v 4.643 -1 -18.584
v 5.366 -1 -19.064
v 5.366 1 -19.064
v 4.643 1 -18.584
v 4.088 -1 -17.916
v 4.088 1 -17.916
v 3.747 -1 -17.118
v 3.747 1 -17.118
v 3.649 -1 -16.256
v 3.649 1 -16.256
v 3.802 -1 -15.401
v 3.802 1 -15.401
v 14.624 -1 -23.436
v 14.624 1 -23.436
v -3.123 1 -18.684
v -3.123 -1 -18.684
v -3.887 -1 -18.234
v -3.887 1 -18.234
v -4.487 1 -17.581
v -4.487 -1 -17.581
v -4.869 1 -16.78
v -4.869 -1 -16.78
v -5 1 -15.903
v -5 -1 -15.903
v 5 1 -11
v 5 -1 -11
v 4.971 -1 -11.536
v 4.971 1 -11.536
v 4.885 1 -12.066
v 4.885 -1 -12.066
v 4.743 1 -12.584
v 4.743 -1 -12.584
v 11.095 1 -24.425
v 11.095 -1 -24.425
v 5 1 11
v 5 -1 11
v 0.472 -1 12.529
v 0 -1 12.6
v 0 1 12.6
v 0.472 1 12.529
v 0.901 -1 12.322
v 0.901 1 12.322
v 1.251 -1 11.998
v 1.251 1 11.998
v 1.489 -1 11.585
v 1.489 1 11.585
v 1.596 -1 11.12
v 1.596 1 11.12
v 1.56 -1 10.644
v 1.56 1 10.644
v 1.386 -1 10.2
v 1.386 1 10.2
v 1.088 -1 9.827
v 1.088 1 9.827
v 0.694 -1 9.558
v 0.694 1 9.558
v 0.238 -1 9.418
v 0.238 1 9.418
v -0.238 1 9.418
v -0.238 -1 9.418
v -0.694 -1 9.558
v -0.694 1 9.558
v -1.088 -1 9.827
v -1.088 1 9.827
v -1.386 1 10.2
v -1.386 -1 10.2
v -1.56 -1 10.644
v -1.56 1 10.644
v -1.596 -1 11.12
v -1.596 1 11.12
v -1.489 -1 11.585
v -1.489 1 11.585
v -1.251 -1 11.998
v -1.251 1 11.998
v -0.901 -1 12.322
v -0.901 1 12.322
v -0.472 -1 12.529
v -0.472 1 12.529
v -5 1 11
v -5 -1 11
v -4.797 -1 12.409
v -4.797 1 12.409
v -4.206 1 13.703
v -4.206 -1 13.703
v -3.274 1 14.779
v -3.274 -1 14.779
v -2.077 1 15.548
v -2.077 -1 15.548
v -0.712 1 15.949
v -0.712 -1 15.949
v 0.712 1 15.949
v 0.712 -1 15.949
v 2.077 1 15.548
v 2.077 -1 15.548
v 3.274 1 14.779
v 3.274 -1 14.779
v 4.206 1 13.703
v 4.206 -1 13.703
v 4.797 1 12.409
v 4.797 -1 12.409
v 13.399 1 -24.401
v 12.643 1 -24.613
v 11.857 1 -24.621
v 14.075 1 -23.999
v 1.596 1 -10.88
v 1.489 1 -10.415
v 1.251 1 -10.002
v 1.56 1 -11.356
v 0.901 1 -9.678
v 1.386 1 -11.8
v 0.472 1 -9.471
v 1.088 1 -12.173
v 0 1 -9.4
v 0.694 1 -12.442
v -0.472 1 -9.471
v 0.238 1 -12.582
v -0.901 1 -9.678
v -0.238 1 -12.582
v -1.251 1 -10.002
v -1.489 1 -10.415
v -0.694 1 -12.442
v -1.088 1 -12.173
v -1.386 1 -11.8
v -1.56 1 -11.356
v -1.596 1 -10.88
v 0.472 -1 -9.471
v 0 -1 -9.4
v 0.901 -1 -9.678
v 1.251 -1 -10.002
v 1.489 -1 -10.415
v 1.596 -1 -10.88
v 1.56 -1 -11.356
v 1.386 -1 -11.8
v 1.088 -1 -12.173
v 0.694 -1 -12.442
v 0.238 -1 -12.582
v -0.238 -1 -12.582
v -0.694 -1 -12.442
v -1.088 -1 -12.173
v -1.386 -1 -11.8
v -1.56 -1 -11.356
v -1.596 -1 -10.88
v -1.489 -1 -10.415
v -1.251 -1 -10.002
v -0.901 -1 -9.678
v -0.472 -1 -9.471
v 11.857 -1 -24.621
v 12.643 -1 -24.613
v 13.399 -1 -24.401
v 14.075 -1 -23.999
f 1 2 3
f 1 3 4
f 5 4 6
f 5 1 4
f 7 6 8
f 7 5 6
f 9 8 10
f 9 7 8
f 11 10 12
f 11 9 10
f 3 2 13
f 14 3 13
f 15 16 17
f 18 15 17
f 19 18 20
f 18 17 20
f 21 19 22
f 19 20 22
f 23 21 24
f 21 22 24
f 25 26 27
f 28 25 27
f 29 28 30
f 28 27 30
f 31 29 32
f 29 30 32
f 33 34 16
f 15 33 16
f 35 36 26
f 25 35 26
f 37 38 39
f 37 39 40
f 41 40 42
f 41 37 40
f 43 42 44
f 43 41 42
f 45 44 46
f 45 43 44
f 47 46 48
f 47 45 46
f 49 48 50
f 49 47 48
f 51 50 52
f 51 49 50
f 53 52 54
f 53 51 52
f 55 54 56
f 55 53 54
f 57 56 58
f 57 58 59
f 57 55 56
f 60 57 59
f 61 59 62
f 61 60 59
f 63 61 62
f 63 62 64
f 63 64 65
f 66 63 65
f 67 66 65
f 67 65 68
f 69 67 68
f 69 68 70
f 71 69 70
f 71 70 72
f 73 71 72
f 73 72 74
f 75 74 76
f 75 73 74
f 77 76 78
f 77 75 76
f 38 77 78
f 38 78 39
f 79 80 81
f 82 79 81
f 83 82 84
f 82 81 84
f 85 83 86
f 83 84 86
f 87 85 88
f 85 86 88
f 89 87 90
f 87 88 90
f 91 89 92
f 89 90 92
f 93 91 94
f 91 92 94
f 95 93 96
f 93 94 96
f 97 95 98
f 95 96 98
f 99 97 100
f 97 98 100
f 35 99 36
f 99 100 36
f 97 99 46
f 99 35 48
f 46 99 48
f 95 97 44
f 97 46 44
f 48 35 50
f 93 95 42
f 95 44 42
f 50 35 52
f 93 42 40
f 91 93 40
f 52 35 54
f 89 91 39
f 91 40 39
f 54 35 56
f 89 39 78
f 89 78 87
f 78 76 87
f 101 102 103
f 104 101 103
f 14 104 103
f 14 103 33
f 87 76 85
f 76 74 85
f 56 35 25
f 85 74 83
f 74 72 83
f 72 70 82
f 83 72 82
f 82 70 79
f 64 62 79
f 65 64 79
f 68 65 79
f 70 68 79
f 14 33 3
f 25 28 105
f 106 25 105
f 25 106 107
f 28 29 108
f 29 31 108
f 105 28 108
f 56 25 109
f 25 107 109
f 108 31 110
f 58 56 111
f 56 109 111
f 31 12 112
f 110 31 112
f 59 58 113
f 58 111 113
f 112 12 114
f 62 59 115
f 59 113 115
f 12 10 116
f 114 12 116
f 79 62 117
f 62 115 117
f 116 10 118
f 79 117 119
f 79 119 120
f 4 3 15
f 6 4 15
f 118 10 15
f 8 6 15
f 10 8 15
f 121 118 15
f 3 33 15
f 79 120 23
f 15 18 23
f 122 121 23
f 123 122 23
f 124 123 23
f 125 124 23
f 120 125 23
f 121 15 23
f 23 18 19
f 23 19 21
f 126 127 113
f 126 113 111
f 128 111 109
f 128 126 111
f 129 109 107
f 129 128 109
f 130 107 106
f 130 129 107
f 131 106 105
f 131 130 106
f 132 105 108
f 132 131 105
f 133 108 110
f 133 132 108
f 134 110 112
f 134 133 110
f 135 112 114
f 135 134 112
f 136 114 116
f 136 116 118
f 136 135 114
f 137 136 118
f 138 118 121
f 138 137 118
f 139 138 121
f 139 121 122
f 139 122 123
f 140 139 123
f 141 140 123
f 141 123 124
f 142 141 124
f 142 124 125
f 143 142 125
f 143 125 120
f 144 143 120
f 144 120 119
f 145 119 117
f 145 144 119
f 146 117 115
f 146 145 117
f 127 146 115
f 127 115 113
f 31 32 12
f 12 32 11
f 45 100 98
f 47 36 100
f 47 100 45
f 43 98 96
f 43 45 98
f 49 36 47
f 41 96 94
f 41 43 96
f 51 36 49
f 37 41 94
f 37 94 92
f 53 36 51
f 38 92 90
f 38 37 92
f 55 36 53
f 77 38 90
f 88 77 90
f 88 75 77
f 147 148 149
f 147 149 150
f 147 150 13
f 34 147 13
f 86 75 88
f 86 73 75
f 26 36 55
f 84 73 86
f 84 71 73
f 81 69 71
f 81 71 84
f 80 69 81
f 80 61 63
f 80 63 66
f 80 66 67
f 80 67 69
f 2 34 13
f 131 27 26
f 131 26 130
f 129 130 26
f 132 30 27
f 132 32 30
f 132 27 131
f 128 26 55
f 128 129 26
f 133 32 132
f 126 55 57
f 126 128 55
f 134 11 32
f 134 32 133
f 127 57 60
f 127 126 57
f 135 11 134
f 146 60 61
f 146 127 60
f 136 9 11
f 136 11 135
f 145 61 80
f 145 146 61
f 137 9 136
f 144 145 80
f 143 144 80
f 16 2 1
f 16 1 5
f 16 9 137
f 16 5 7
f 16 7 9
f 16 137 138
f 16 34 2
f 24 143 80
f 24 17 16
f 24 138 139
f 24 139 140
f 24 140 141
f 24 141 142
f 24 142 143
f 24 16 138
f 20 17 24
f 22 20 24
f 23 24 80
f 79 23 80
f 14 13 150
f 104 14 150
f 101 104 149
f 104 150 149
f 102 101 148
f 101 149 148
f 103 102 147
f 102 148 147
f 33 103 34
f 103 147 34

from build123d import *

# Parameters (mm, degrees)
BOSS_EXTRUDE1_DEPTH      = 1
BOSS_EXTRUDE1_DEPTH_BACK = 1
SKETCH1_R                = 1.6
BOSS_EXTRUDE4_START      = -2
BOSS_EXTRUDE4_DEPTH      = 2
FILLET1_R                = 3


with BuildPart() as part:
    # Sketch1 → Boss-Extrude1 (new, two sides: drawn at the far end of the back side and taken through both)
    with BuildSketch(Plane(origin=(0, 0, 0), x_dir=(1, 0, 0), z_dir=(0, 1, 0)).offset(-BOSS_EXTRUDE1_DEPTH_BACK)):
        with BuildLine():
            ThreePointArc((5, 11), (0, 16), (-5, 11))
            Line((-5, 11), (-5, -11))
            ThreePointArc((-5, -11), (0, -16), (5, -11))
            Line((5, -11), (5, 11))
        make_face()
        with Locations(Location((0, 11, 0), (0, 0, 270))):
            Circle(SKETCH1_R, mode=Mode.SUBTRACT)
        with Locations(Location((0, -11, 0), (0, 0, 270))):
            Circle(SKETCH1_R, mode=Mode.SUBTRACT)
    extrude(amount=BOSS_EXTRUDE1_DEPTH + BOSS_EXTRUDE1_DEPTH_BACK)

    # Sketch4 → Boss-Extrude4 (add)
    with BuildSketch(Plane(origin=(0, 1, 0), x_dir=(1, 0, 0), z_dir=(0, 1, 0)).offset(BOSS_EXTRUDE4_START)):
        with BuildLine():
            Line((2.958312472, 17.926759894), (-2.135268449, 15.521131346))
            ThreePointArc((-2.135268449, 15.521131346), (1.963819075, 15.59819689), (4.742555811, 12.58371853))
            Line((4.742555811, 12.58371853), (2.958312472, 17.926759894))
        make_face()
        with BuildLine():
            ThreePointArc((-5, 11), (-4.223525911, 13.676159352), (-2.135268449, 15.521131346))
            Line((-2.135268449, 15.521131346), (2.958312472, 17.926759894))
            Line((2.958312472, 17.926759894), (14.623518216, 23.436076894))
            Line((14.623518216, 23.436076894), (13.666416412, 25.462605676))
            Line((13.666416412, 25.462605676), (-5, 17.926759894))
            Line((-5, 17.926759894), (-5, 11))
        make_face()
    extrude(amount=BOSS_EXTRUDE4_DEPTH)

    # Fillet1
    # the kernel refuses this fillet: 3 mm, written as the material it adds along each edge
    with BuildSketch(Plane(origin=(2.958312472, -1, -17.926759894), x_dir=(0.9042262692177064, 0, -0.42705368989932413), z_dir=(0, 1, 0))) as fillet1_piece_1:
        with BuildLine():
            CenterArc((FILLET1_R * 0.887613530768, -FILLET1_R), FILLET1_R, 90, 83.185387179)
            Line((-FILLET1_R * 0.105321747078, -FILLET1_R * 0.881342787793), (0, 0))
            Line((0, 0), (FILLET1_R * 0.887613530768, 0))
        make_face()
    extrude(amount=2)
    # the kernel refuses this fillet: 3 mm, written as the material it takes off along each edge
    with BuildSketch(Plane(origin=(13.666416412, -7.931521676, -25.462605676), x_dir=(0.42705368989932463, 0, 0.904226269217706), z_dir=(0, 1, 0))) as fillet1_2_piece_1:
        with BuildLine():
            CenterArc((2.835616342, -2.940516757), FILLET1_R, 101.428639538, 75.275128979)
            Line((-0.159420459, -2.768021668), (0, 0))
            Line((0, 0), (2.241174417, 0))
        make_face()
    extrude(amount=15.863043352, mode=Mode.SUBTRACT)
    with BuildSketch(Plane(origin=(-5, -6.060290677, -17.926759894), x_dir=(0, 0, 1), z_dir=(0, 1, 0))) as fillet1_2_piece_2:
        with BuildLine():
            CenterArc((FILLET1_R * 0.674705423588, FILLET1_R), FILLET1_R, 201.984493206, 68.015506794)
            Line((-FILLET1_R * 0.252579782273, FILLET1_R * 0.625644357607), (0, 0))
            Line((0, 0), (FILLET1_R * 0.674705423588, 0))
        make_face()
    extrude(amount=12.120581354, mode=Mode.SUBTRACT)


solid = part.part
